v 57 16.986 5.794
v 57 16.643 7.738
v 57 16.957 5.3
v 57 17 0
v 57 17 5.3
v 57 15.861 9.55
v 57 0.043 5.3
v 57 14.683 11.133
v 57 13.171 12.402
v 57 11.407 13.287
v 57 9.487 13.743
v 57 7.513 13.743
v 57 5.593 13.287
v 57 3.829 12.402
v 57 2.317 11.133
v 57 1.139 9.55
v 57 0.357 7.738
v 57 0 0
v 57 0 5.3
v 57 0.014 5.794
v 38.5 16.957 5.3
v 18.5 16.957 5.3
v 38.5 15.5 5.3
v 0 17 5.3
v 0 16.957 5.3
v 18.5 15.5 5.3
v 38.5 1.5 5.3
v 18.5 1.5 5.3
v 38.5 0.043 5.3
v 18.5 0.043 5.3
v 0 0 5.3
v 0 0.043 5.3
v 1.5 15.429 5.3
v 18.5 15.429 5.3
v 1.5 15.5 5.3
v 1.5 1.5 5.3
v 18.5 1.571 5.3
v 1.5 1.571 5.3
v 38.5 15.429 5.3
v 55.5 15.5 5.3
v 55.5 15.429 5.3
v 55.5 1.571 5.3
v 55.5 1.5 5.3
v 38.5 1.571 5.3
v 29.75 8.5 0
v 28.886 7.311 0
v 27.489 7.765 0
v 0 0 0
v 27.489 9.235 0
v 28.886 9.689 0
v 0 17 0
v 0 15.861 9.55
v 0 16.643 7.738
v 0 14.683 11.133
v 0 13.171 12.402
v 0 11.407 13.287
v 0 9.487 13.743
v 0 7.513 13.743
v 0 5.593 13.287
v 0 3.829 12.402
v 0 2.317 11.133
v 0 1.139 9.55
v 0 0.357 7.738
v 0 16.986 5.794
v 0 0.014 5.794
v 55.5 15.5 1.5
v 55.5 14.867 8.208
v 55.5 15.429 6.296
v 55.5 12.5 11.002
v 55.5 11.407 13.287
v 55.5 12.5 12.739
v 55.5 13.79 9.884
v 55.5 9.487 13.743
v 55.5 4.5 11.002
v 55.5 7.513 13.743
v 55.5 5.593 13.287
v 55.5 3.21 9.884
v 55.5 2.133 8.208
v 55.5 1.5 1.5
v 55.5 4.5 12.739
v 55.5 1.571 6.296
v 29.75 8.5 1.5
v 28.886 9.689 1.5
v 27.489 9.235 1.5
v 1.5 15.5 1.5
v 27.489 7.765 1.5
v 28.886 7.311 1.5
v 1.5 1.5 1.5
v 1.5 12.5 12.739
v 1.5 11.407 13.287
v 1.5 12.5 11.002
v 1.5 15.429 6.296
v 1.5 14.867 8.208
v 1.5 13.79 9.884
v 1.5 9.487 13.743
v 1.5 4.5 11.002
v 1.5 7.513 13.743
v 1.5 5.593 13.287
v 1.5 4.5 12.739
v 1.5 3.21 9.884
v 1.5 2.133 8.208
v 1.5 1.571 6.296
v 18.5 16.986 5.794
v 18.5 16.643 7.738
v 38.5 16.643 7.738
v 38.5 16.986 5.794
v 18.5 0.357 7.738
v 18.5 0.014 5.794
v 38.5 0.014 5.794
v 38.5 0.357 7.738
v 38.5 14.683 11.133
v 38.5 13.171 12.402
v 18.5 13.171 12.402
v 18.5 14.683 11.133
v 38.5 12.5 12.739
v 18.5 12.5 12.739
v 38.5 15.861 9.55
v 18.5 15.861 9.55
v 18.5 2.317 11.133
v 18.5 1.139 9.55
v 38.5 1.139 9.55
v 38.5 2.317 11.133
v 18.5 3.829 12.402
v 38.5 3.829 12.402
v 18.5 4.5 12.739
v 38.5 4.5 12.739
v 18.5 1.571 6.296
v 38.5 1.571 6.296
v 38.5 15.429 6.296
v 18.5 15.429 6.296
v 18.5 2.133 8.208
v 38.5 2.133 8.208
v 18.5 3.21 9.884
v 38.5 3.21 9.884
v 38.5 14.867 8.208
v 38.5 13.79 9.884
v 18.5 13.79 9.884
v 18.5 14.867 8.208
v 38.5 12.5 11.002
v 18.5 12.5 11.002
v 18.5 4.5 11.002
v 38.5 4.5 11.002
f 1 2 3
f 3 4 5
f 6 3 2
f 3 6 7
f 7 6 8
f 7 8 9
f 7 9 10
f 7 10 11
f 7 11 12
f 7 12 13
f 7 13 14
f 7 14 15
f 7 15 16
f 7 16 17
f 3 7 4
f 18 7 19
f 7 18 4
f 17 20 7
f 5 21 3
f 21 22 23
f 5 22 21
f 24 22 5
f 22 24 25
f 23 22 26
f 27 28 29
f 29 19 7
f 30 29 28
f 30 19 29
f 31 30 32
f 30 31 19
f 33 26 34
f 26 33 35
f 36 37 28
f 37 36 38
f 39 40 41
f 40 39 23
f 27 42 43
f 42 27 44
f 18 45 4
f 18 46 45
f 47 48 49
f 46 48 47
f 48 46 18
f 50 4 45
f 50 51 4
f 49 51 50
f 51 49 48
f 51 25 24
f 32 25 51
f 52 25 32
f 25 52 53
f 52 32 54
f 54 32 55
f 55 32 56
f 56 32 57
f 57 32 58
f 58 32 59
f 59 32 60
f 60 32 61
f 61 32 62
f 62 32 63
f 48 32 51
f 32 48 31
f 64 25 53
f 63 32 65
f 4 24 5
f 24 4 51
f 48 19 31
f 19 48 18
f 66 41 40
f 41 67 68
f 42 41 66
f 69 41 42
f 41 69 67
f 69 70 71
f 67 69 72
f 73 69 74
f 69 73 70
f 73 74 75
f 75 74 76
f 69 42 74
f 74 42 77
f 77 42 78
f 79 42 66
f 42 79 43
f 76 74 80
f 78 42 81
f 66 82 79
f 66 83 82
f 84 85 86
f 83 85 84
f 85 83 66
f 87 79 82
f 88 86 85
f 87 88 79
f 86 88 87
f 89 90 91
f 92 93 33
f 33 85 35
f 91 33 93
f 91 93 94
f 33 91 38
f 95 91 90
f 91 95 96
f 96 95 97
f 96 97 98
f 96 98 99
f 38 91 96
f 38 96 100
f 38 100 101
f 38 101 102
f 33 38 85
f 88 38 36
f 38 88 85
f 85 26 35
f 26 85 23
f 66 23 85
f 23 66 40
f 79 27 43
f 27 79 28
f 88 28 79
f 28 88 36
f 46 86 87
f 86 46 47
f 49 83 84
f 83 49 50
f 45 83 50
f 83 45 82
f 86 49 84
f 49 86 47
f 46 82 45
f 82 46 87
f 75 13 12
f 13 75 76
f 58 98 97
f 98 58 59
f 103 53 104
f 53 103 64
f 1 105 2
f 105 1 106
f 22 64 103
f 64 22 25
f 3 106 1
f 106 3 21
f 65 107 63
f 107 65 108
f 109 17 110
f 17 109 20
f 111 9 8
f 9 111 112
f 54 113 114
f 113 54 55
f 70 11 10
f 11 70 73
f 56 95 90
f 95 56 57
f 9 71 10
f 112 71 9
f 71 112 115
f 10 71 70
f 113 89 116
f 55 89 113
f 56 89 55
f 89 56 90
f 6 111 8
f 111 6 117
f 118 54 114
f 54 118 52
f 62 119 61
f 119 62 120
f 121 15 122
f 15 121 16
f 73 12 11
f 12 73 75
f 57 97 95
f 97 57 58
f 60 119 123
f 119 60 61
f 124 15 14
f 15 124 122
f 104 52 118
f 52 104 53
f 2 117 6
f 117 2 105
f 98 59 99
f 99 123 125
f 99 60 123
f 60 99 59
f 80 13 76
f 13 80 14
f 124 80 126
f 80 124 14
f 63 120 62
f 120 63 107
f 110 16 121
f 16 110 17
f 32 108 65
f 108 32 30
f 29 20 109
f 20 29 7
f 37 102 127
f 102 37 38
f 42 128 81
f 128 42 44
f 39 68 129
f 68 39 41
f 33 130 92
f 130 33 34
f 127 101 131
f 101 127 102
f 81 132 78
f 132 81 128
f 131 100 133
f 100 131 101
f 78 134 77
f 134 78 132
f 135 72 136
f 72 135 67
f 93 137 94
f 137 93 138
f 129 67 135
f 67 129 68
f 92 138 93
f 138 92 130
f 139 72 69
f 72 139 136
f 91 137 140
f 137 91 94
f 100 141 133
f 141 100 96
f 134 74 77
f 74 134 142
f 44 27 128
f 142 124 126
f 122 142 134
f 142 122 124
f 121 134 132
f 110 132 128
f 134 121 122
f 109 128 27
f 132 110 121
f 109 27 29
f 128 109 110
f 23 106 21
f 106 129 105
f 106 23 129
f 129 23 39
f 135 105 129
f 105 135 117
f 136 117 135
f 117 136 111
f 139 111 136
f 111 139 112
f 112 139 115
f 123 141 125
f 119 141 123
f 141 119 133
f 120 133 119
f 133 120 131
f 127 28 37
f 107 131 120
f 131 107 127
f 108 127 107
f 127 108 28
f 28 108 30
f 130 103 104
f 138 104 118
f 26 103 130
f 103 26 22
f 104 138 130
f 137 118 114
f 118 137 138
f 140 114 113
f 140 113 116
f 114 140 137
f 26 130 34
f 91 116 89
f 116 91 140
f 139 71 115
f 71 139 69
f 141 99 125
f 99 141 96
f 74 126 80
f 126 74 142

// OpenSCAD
// measurements


module batteryAAHolder() {
    holder_length = 57;
    holder_width = 17;
    holder_height = 13.8;
    center_hole_to_top = 5.5;
    mount_hole_diameter = 2.5;

    cut_out_bottom = 5.5;
    middle_cut_out_width = 20;

    top_cutout_width = 8;

    thickness = 1.5;
    circle_thickness = .8;

    episilon = .001;

    circle_radius = holder_width/2;
    circle_z = holder_height - circle_radius;

    difference() {
        cube([holder_length, holder_width, circle_z]);
        
        translate([thickness, thickness, thickness])
        cube([holder_length-2*thickness, holder_width-2*thickness, circle_z]);

        translate([holder_length/2, holder_width/2,-episilon])
        cylinder(h=10, r=mount_hole_diameter/2);
    }
    
    difference() {
        translate([0,holder_width/2,circle_z])
        rotate([0,90,0])
        cylinder(h=holder_length, r=holder_width/2);

        translate([thickness,holder_width/2,circle_z])
        rotate([0,90,0])
        cylinder(h=holder_length-thickness*2, r=holder_width/2-thickness);

        translate([-episilon,0,-10+circle_z])
        cube([holder_length+2*episilon, holder_width, 10]);

        translate([holder_length/2-middle_cut_out_width/2, 0, circle_z-episilon])
        cube([middle_cut_out_width, holder_width, 10]);

        translate([thickness, holder_width/2-top_cutout_width/2, 0])
        cube([holder_length-thickness*2, top_cutout_width, 20]);

    }

}

batteryAAHolder();
